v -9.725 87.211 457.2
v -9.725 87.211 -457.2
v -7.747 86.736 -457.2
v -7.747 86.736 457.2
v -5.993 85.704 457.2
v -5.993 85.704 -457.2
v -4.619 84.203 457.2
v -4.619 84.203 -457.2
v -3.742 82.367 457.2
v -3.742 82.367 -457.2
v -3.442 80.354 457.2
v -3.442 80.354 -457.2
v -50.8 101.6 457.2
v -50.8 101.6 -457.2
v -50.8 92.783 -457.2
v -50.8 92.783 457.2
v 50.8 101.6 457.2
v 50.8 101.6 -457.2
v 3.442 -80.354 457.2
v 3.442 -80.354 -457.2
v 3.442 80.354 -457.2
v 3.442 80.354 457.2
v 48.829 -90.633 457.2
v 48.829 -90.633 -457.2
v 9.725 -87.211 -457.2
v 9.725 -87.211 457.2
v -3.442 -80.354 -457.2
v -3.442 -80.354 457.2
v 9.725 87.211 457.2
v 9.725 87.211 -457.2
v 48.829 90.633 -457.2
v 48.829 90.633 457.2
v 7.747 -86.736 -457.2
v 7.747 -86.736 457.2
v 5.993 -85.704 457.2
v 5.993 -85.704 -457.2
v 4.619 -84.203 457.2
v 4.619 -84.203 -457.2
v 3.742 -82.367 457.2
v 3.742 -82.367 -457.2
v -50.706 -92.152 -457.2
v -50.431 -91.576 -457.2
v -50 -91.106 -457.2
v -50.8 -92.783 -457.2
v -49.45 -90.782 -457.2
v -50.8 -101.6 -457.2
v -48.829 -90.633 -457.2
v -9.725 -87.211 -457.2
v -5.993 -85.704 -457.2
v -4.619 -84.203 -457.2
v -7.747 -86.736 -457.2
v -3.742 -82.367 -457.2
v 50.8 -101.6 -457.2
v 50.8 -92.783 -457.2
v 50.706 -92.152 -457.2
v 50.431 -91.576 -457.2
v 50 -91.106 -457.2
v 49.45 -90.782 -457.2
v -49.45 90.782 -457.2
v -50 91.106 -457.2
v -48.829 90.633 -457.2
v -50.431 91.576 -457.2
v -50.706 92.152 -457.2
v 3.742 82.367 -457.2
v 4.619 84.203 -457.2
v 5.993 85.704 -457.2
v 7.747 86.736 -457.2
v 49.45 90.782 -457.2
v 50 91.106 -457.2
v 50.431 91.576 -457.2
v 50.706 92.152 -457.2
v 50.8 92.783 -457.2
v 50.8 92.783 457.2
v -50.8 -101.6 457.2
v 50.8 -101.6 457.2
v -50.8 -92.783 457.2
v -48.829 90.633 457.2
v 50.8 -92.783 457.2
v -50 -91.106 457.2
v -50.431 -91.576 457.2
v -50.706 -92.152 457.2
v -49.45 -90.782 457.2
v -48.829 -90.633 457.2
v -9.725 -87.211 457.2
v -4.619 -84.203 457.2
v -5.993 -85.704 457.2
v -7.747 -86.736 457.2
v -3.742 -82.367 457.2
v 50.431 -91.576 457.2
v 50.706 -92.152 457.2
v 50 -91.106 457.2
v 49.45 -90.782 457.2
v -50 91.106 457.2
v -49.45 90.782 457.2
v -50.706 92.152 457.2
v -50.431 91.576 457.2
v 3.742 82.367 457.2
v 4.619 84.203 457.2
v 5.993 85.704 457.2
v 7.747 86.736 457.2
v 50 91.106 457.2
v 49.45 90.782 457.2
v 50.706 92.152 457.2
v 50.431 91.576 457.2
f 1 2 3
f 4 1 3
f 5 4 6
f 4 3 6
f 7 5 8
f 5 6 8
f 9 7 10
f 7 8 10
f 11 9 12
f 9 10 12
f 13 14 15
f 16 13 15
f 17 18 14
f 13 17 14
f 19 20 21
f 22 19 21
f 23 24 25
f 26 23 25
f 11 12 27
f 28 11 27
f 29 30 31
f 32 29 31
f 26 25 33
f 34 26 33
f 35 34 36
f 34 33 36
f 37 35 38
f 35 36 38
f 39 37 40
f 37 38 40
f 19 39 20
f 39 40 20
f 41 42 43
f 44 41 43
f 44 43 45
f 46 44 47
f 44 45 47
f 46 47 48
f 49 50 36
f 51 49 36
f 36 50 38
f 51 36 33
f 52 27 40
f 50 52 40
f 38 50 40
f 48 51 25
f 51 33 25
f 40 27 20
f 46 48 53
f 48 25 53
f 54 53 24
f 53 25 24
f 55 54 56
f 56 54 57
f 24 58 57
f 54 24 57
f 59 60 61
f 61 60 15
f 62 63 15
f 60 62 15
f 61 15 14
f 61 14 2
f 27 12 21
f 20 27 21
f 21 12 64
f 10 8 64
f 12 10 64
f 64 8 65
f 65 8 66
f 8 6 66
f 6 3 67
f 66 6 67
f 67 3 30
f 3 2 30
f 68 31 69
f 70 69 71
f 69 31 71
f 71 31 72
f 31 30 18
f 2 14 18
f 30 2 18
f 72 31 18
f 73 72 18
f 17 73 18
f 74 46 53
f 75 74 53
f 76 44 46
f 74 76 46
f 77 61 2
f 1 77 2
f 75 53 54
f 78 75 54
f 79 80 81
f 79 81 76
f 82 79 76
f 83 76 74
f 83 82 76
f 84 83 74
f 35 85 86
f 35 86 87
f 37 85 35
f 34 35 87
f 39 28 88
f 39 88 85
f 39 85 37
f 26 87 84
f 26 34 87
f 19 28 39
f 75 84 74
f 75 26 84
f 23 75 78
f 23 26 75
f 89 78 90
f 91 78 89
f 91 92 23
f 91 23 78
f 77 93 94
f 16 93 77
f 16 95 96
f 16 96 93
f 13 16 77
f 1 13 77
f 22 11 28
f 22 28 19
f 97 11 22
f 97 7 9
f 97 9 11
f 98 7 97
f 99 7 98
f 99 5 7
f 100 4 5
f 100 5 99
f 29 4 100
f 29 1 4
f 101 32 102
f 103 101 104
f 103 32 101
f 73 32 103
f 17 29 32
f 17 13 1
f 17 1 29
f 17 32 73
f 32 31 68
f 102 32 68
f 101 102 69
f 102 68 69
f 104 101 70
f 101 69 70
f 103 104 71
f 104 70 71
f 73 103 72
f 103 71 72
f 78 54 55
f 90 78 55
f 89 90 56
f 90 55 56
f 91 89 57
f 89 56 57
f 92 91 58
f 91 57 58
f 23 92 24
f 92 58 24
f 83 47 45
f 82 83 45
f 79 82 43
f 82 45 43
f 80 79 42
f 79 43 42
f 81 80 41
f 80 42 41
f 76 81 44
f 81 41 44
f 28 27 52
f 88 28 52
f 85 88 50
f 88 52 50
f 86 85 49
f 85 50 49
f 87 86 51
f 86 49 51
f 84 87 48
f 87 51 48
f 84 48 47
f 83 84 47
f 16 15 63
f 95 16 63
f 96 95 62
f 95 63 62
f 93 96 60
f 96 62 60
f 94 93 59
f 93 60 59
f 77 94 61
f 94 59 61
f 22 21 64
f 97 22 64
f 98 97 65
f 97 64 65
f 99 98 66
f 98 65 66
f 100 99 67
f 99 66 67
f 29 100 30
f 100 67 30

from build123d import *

# Parameters (mm, degrees)
BOSS_EXTRUDE1_START = -457.2
BOSS_EXTRUDE1_DEPTH = 914.4


with BuildPart() as part:
    # Sketch3 → Boss-Extrude1 (new body)
    with BuildSketch(Plane.XY.offset(BOSS_EXTRUDE1_START)):
        with BuildLine():
            Line((-50.8, -101.6), (50.8, -101.6))
            Line((50.8, -101.6), (50.8, -92.783359005))
            ThreePointArc((50.8, -92.783359005), (50.23278177, -91.324759746), (48.829169249, -90.632574652))
            Line((48.829169249, -90.632574652), (9.72517216, -87.211418208))
            ThreePointArc((9.72517216, -87.211418208), (5.25012518, -85.004569258), (3.4417, -80.354211623))
            Line((3.4417, -80.354211623), (3.4417, 80.354211623))
            ThreePointArc((3.4417, 80.354211623), (5.25012518, 85.004569258), (9.72517216, 87.211418208))
            Line((9.72517216, 87.211418208), (48.829169249, 90.632574652))
            ThreePointArc((48.829169249, 90.632574652), (50.23278177, 91.324759746), (50.8, 92.783359005))
            Line((50.8, 92.783359005), (50.8, 101.6))
            Line((50.8, 101.6), (-50.8, 101.6))
            Line((-50.8, 101.6), (-50.8, 92.783359005))
            ThreePointArc((-50.8, 92.783359005), (-50.23278177, 91.324759746), (-48.829169249, 90.632574652))
            Line((-48.829169249, 90.632574652), (-9.72517216, 87.211418208))
            ThreePointArc((-9.72517216, 87.211418208), (-5.25012518, 85.004569258), (-3.4417, 80.354211623))
            Line((-3.4417, 80.354211623), (-3.4417, -80.354211623))
            ThreePointArc((-3.4417, -80.354211623), (-5.25012518, -85.004569258), (-9.72517216, -87.211418208))
            Line((-9.72517216, -87.211418208), (-48.829169249, -90.632574652))
            ThreePointArc((-48.829169249, -90.632574652), (-50.23278177, -91.324759746), (-50.8, -92.783359005))
            Line((-50.8, -92.783359005), (-50.8, -101.6))
        make_face()
    extrude(amount=BOSS_EXTRUDE1_DEPTH)


solid = part.part
